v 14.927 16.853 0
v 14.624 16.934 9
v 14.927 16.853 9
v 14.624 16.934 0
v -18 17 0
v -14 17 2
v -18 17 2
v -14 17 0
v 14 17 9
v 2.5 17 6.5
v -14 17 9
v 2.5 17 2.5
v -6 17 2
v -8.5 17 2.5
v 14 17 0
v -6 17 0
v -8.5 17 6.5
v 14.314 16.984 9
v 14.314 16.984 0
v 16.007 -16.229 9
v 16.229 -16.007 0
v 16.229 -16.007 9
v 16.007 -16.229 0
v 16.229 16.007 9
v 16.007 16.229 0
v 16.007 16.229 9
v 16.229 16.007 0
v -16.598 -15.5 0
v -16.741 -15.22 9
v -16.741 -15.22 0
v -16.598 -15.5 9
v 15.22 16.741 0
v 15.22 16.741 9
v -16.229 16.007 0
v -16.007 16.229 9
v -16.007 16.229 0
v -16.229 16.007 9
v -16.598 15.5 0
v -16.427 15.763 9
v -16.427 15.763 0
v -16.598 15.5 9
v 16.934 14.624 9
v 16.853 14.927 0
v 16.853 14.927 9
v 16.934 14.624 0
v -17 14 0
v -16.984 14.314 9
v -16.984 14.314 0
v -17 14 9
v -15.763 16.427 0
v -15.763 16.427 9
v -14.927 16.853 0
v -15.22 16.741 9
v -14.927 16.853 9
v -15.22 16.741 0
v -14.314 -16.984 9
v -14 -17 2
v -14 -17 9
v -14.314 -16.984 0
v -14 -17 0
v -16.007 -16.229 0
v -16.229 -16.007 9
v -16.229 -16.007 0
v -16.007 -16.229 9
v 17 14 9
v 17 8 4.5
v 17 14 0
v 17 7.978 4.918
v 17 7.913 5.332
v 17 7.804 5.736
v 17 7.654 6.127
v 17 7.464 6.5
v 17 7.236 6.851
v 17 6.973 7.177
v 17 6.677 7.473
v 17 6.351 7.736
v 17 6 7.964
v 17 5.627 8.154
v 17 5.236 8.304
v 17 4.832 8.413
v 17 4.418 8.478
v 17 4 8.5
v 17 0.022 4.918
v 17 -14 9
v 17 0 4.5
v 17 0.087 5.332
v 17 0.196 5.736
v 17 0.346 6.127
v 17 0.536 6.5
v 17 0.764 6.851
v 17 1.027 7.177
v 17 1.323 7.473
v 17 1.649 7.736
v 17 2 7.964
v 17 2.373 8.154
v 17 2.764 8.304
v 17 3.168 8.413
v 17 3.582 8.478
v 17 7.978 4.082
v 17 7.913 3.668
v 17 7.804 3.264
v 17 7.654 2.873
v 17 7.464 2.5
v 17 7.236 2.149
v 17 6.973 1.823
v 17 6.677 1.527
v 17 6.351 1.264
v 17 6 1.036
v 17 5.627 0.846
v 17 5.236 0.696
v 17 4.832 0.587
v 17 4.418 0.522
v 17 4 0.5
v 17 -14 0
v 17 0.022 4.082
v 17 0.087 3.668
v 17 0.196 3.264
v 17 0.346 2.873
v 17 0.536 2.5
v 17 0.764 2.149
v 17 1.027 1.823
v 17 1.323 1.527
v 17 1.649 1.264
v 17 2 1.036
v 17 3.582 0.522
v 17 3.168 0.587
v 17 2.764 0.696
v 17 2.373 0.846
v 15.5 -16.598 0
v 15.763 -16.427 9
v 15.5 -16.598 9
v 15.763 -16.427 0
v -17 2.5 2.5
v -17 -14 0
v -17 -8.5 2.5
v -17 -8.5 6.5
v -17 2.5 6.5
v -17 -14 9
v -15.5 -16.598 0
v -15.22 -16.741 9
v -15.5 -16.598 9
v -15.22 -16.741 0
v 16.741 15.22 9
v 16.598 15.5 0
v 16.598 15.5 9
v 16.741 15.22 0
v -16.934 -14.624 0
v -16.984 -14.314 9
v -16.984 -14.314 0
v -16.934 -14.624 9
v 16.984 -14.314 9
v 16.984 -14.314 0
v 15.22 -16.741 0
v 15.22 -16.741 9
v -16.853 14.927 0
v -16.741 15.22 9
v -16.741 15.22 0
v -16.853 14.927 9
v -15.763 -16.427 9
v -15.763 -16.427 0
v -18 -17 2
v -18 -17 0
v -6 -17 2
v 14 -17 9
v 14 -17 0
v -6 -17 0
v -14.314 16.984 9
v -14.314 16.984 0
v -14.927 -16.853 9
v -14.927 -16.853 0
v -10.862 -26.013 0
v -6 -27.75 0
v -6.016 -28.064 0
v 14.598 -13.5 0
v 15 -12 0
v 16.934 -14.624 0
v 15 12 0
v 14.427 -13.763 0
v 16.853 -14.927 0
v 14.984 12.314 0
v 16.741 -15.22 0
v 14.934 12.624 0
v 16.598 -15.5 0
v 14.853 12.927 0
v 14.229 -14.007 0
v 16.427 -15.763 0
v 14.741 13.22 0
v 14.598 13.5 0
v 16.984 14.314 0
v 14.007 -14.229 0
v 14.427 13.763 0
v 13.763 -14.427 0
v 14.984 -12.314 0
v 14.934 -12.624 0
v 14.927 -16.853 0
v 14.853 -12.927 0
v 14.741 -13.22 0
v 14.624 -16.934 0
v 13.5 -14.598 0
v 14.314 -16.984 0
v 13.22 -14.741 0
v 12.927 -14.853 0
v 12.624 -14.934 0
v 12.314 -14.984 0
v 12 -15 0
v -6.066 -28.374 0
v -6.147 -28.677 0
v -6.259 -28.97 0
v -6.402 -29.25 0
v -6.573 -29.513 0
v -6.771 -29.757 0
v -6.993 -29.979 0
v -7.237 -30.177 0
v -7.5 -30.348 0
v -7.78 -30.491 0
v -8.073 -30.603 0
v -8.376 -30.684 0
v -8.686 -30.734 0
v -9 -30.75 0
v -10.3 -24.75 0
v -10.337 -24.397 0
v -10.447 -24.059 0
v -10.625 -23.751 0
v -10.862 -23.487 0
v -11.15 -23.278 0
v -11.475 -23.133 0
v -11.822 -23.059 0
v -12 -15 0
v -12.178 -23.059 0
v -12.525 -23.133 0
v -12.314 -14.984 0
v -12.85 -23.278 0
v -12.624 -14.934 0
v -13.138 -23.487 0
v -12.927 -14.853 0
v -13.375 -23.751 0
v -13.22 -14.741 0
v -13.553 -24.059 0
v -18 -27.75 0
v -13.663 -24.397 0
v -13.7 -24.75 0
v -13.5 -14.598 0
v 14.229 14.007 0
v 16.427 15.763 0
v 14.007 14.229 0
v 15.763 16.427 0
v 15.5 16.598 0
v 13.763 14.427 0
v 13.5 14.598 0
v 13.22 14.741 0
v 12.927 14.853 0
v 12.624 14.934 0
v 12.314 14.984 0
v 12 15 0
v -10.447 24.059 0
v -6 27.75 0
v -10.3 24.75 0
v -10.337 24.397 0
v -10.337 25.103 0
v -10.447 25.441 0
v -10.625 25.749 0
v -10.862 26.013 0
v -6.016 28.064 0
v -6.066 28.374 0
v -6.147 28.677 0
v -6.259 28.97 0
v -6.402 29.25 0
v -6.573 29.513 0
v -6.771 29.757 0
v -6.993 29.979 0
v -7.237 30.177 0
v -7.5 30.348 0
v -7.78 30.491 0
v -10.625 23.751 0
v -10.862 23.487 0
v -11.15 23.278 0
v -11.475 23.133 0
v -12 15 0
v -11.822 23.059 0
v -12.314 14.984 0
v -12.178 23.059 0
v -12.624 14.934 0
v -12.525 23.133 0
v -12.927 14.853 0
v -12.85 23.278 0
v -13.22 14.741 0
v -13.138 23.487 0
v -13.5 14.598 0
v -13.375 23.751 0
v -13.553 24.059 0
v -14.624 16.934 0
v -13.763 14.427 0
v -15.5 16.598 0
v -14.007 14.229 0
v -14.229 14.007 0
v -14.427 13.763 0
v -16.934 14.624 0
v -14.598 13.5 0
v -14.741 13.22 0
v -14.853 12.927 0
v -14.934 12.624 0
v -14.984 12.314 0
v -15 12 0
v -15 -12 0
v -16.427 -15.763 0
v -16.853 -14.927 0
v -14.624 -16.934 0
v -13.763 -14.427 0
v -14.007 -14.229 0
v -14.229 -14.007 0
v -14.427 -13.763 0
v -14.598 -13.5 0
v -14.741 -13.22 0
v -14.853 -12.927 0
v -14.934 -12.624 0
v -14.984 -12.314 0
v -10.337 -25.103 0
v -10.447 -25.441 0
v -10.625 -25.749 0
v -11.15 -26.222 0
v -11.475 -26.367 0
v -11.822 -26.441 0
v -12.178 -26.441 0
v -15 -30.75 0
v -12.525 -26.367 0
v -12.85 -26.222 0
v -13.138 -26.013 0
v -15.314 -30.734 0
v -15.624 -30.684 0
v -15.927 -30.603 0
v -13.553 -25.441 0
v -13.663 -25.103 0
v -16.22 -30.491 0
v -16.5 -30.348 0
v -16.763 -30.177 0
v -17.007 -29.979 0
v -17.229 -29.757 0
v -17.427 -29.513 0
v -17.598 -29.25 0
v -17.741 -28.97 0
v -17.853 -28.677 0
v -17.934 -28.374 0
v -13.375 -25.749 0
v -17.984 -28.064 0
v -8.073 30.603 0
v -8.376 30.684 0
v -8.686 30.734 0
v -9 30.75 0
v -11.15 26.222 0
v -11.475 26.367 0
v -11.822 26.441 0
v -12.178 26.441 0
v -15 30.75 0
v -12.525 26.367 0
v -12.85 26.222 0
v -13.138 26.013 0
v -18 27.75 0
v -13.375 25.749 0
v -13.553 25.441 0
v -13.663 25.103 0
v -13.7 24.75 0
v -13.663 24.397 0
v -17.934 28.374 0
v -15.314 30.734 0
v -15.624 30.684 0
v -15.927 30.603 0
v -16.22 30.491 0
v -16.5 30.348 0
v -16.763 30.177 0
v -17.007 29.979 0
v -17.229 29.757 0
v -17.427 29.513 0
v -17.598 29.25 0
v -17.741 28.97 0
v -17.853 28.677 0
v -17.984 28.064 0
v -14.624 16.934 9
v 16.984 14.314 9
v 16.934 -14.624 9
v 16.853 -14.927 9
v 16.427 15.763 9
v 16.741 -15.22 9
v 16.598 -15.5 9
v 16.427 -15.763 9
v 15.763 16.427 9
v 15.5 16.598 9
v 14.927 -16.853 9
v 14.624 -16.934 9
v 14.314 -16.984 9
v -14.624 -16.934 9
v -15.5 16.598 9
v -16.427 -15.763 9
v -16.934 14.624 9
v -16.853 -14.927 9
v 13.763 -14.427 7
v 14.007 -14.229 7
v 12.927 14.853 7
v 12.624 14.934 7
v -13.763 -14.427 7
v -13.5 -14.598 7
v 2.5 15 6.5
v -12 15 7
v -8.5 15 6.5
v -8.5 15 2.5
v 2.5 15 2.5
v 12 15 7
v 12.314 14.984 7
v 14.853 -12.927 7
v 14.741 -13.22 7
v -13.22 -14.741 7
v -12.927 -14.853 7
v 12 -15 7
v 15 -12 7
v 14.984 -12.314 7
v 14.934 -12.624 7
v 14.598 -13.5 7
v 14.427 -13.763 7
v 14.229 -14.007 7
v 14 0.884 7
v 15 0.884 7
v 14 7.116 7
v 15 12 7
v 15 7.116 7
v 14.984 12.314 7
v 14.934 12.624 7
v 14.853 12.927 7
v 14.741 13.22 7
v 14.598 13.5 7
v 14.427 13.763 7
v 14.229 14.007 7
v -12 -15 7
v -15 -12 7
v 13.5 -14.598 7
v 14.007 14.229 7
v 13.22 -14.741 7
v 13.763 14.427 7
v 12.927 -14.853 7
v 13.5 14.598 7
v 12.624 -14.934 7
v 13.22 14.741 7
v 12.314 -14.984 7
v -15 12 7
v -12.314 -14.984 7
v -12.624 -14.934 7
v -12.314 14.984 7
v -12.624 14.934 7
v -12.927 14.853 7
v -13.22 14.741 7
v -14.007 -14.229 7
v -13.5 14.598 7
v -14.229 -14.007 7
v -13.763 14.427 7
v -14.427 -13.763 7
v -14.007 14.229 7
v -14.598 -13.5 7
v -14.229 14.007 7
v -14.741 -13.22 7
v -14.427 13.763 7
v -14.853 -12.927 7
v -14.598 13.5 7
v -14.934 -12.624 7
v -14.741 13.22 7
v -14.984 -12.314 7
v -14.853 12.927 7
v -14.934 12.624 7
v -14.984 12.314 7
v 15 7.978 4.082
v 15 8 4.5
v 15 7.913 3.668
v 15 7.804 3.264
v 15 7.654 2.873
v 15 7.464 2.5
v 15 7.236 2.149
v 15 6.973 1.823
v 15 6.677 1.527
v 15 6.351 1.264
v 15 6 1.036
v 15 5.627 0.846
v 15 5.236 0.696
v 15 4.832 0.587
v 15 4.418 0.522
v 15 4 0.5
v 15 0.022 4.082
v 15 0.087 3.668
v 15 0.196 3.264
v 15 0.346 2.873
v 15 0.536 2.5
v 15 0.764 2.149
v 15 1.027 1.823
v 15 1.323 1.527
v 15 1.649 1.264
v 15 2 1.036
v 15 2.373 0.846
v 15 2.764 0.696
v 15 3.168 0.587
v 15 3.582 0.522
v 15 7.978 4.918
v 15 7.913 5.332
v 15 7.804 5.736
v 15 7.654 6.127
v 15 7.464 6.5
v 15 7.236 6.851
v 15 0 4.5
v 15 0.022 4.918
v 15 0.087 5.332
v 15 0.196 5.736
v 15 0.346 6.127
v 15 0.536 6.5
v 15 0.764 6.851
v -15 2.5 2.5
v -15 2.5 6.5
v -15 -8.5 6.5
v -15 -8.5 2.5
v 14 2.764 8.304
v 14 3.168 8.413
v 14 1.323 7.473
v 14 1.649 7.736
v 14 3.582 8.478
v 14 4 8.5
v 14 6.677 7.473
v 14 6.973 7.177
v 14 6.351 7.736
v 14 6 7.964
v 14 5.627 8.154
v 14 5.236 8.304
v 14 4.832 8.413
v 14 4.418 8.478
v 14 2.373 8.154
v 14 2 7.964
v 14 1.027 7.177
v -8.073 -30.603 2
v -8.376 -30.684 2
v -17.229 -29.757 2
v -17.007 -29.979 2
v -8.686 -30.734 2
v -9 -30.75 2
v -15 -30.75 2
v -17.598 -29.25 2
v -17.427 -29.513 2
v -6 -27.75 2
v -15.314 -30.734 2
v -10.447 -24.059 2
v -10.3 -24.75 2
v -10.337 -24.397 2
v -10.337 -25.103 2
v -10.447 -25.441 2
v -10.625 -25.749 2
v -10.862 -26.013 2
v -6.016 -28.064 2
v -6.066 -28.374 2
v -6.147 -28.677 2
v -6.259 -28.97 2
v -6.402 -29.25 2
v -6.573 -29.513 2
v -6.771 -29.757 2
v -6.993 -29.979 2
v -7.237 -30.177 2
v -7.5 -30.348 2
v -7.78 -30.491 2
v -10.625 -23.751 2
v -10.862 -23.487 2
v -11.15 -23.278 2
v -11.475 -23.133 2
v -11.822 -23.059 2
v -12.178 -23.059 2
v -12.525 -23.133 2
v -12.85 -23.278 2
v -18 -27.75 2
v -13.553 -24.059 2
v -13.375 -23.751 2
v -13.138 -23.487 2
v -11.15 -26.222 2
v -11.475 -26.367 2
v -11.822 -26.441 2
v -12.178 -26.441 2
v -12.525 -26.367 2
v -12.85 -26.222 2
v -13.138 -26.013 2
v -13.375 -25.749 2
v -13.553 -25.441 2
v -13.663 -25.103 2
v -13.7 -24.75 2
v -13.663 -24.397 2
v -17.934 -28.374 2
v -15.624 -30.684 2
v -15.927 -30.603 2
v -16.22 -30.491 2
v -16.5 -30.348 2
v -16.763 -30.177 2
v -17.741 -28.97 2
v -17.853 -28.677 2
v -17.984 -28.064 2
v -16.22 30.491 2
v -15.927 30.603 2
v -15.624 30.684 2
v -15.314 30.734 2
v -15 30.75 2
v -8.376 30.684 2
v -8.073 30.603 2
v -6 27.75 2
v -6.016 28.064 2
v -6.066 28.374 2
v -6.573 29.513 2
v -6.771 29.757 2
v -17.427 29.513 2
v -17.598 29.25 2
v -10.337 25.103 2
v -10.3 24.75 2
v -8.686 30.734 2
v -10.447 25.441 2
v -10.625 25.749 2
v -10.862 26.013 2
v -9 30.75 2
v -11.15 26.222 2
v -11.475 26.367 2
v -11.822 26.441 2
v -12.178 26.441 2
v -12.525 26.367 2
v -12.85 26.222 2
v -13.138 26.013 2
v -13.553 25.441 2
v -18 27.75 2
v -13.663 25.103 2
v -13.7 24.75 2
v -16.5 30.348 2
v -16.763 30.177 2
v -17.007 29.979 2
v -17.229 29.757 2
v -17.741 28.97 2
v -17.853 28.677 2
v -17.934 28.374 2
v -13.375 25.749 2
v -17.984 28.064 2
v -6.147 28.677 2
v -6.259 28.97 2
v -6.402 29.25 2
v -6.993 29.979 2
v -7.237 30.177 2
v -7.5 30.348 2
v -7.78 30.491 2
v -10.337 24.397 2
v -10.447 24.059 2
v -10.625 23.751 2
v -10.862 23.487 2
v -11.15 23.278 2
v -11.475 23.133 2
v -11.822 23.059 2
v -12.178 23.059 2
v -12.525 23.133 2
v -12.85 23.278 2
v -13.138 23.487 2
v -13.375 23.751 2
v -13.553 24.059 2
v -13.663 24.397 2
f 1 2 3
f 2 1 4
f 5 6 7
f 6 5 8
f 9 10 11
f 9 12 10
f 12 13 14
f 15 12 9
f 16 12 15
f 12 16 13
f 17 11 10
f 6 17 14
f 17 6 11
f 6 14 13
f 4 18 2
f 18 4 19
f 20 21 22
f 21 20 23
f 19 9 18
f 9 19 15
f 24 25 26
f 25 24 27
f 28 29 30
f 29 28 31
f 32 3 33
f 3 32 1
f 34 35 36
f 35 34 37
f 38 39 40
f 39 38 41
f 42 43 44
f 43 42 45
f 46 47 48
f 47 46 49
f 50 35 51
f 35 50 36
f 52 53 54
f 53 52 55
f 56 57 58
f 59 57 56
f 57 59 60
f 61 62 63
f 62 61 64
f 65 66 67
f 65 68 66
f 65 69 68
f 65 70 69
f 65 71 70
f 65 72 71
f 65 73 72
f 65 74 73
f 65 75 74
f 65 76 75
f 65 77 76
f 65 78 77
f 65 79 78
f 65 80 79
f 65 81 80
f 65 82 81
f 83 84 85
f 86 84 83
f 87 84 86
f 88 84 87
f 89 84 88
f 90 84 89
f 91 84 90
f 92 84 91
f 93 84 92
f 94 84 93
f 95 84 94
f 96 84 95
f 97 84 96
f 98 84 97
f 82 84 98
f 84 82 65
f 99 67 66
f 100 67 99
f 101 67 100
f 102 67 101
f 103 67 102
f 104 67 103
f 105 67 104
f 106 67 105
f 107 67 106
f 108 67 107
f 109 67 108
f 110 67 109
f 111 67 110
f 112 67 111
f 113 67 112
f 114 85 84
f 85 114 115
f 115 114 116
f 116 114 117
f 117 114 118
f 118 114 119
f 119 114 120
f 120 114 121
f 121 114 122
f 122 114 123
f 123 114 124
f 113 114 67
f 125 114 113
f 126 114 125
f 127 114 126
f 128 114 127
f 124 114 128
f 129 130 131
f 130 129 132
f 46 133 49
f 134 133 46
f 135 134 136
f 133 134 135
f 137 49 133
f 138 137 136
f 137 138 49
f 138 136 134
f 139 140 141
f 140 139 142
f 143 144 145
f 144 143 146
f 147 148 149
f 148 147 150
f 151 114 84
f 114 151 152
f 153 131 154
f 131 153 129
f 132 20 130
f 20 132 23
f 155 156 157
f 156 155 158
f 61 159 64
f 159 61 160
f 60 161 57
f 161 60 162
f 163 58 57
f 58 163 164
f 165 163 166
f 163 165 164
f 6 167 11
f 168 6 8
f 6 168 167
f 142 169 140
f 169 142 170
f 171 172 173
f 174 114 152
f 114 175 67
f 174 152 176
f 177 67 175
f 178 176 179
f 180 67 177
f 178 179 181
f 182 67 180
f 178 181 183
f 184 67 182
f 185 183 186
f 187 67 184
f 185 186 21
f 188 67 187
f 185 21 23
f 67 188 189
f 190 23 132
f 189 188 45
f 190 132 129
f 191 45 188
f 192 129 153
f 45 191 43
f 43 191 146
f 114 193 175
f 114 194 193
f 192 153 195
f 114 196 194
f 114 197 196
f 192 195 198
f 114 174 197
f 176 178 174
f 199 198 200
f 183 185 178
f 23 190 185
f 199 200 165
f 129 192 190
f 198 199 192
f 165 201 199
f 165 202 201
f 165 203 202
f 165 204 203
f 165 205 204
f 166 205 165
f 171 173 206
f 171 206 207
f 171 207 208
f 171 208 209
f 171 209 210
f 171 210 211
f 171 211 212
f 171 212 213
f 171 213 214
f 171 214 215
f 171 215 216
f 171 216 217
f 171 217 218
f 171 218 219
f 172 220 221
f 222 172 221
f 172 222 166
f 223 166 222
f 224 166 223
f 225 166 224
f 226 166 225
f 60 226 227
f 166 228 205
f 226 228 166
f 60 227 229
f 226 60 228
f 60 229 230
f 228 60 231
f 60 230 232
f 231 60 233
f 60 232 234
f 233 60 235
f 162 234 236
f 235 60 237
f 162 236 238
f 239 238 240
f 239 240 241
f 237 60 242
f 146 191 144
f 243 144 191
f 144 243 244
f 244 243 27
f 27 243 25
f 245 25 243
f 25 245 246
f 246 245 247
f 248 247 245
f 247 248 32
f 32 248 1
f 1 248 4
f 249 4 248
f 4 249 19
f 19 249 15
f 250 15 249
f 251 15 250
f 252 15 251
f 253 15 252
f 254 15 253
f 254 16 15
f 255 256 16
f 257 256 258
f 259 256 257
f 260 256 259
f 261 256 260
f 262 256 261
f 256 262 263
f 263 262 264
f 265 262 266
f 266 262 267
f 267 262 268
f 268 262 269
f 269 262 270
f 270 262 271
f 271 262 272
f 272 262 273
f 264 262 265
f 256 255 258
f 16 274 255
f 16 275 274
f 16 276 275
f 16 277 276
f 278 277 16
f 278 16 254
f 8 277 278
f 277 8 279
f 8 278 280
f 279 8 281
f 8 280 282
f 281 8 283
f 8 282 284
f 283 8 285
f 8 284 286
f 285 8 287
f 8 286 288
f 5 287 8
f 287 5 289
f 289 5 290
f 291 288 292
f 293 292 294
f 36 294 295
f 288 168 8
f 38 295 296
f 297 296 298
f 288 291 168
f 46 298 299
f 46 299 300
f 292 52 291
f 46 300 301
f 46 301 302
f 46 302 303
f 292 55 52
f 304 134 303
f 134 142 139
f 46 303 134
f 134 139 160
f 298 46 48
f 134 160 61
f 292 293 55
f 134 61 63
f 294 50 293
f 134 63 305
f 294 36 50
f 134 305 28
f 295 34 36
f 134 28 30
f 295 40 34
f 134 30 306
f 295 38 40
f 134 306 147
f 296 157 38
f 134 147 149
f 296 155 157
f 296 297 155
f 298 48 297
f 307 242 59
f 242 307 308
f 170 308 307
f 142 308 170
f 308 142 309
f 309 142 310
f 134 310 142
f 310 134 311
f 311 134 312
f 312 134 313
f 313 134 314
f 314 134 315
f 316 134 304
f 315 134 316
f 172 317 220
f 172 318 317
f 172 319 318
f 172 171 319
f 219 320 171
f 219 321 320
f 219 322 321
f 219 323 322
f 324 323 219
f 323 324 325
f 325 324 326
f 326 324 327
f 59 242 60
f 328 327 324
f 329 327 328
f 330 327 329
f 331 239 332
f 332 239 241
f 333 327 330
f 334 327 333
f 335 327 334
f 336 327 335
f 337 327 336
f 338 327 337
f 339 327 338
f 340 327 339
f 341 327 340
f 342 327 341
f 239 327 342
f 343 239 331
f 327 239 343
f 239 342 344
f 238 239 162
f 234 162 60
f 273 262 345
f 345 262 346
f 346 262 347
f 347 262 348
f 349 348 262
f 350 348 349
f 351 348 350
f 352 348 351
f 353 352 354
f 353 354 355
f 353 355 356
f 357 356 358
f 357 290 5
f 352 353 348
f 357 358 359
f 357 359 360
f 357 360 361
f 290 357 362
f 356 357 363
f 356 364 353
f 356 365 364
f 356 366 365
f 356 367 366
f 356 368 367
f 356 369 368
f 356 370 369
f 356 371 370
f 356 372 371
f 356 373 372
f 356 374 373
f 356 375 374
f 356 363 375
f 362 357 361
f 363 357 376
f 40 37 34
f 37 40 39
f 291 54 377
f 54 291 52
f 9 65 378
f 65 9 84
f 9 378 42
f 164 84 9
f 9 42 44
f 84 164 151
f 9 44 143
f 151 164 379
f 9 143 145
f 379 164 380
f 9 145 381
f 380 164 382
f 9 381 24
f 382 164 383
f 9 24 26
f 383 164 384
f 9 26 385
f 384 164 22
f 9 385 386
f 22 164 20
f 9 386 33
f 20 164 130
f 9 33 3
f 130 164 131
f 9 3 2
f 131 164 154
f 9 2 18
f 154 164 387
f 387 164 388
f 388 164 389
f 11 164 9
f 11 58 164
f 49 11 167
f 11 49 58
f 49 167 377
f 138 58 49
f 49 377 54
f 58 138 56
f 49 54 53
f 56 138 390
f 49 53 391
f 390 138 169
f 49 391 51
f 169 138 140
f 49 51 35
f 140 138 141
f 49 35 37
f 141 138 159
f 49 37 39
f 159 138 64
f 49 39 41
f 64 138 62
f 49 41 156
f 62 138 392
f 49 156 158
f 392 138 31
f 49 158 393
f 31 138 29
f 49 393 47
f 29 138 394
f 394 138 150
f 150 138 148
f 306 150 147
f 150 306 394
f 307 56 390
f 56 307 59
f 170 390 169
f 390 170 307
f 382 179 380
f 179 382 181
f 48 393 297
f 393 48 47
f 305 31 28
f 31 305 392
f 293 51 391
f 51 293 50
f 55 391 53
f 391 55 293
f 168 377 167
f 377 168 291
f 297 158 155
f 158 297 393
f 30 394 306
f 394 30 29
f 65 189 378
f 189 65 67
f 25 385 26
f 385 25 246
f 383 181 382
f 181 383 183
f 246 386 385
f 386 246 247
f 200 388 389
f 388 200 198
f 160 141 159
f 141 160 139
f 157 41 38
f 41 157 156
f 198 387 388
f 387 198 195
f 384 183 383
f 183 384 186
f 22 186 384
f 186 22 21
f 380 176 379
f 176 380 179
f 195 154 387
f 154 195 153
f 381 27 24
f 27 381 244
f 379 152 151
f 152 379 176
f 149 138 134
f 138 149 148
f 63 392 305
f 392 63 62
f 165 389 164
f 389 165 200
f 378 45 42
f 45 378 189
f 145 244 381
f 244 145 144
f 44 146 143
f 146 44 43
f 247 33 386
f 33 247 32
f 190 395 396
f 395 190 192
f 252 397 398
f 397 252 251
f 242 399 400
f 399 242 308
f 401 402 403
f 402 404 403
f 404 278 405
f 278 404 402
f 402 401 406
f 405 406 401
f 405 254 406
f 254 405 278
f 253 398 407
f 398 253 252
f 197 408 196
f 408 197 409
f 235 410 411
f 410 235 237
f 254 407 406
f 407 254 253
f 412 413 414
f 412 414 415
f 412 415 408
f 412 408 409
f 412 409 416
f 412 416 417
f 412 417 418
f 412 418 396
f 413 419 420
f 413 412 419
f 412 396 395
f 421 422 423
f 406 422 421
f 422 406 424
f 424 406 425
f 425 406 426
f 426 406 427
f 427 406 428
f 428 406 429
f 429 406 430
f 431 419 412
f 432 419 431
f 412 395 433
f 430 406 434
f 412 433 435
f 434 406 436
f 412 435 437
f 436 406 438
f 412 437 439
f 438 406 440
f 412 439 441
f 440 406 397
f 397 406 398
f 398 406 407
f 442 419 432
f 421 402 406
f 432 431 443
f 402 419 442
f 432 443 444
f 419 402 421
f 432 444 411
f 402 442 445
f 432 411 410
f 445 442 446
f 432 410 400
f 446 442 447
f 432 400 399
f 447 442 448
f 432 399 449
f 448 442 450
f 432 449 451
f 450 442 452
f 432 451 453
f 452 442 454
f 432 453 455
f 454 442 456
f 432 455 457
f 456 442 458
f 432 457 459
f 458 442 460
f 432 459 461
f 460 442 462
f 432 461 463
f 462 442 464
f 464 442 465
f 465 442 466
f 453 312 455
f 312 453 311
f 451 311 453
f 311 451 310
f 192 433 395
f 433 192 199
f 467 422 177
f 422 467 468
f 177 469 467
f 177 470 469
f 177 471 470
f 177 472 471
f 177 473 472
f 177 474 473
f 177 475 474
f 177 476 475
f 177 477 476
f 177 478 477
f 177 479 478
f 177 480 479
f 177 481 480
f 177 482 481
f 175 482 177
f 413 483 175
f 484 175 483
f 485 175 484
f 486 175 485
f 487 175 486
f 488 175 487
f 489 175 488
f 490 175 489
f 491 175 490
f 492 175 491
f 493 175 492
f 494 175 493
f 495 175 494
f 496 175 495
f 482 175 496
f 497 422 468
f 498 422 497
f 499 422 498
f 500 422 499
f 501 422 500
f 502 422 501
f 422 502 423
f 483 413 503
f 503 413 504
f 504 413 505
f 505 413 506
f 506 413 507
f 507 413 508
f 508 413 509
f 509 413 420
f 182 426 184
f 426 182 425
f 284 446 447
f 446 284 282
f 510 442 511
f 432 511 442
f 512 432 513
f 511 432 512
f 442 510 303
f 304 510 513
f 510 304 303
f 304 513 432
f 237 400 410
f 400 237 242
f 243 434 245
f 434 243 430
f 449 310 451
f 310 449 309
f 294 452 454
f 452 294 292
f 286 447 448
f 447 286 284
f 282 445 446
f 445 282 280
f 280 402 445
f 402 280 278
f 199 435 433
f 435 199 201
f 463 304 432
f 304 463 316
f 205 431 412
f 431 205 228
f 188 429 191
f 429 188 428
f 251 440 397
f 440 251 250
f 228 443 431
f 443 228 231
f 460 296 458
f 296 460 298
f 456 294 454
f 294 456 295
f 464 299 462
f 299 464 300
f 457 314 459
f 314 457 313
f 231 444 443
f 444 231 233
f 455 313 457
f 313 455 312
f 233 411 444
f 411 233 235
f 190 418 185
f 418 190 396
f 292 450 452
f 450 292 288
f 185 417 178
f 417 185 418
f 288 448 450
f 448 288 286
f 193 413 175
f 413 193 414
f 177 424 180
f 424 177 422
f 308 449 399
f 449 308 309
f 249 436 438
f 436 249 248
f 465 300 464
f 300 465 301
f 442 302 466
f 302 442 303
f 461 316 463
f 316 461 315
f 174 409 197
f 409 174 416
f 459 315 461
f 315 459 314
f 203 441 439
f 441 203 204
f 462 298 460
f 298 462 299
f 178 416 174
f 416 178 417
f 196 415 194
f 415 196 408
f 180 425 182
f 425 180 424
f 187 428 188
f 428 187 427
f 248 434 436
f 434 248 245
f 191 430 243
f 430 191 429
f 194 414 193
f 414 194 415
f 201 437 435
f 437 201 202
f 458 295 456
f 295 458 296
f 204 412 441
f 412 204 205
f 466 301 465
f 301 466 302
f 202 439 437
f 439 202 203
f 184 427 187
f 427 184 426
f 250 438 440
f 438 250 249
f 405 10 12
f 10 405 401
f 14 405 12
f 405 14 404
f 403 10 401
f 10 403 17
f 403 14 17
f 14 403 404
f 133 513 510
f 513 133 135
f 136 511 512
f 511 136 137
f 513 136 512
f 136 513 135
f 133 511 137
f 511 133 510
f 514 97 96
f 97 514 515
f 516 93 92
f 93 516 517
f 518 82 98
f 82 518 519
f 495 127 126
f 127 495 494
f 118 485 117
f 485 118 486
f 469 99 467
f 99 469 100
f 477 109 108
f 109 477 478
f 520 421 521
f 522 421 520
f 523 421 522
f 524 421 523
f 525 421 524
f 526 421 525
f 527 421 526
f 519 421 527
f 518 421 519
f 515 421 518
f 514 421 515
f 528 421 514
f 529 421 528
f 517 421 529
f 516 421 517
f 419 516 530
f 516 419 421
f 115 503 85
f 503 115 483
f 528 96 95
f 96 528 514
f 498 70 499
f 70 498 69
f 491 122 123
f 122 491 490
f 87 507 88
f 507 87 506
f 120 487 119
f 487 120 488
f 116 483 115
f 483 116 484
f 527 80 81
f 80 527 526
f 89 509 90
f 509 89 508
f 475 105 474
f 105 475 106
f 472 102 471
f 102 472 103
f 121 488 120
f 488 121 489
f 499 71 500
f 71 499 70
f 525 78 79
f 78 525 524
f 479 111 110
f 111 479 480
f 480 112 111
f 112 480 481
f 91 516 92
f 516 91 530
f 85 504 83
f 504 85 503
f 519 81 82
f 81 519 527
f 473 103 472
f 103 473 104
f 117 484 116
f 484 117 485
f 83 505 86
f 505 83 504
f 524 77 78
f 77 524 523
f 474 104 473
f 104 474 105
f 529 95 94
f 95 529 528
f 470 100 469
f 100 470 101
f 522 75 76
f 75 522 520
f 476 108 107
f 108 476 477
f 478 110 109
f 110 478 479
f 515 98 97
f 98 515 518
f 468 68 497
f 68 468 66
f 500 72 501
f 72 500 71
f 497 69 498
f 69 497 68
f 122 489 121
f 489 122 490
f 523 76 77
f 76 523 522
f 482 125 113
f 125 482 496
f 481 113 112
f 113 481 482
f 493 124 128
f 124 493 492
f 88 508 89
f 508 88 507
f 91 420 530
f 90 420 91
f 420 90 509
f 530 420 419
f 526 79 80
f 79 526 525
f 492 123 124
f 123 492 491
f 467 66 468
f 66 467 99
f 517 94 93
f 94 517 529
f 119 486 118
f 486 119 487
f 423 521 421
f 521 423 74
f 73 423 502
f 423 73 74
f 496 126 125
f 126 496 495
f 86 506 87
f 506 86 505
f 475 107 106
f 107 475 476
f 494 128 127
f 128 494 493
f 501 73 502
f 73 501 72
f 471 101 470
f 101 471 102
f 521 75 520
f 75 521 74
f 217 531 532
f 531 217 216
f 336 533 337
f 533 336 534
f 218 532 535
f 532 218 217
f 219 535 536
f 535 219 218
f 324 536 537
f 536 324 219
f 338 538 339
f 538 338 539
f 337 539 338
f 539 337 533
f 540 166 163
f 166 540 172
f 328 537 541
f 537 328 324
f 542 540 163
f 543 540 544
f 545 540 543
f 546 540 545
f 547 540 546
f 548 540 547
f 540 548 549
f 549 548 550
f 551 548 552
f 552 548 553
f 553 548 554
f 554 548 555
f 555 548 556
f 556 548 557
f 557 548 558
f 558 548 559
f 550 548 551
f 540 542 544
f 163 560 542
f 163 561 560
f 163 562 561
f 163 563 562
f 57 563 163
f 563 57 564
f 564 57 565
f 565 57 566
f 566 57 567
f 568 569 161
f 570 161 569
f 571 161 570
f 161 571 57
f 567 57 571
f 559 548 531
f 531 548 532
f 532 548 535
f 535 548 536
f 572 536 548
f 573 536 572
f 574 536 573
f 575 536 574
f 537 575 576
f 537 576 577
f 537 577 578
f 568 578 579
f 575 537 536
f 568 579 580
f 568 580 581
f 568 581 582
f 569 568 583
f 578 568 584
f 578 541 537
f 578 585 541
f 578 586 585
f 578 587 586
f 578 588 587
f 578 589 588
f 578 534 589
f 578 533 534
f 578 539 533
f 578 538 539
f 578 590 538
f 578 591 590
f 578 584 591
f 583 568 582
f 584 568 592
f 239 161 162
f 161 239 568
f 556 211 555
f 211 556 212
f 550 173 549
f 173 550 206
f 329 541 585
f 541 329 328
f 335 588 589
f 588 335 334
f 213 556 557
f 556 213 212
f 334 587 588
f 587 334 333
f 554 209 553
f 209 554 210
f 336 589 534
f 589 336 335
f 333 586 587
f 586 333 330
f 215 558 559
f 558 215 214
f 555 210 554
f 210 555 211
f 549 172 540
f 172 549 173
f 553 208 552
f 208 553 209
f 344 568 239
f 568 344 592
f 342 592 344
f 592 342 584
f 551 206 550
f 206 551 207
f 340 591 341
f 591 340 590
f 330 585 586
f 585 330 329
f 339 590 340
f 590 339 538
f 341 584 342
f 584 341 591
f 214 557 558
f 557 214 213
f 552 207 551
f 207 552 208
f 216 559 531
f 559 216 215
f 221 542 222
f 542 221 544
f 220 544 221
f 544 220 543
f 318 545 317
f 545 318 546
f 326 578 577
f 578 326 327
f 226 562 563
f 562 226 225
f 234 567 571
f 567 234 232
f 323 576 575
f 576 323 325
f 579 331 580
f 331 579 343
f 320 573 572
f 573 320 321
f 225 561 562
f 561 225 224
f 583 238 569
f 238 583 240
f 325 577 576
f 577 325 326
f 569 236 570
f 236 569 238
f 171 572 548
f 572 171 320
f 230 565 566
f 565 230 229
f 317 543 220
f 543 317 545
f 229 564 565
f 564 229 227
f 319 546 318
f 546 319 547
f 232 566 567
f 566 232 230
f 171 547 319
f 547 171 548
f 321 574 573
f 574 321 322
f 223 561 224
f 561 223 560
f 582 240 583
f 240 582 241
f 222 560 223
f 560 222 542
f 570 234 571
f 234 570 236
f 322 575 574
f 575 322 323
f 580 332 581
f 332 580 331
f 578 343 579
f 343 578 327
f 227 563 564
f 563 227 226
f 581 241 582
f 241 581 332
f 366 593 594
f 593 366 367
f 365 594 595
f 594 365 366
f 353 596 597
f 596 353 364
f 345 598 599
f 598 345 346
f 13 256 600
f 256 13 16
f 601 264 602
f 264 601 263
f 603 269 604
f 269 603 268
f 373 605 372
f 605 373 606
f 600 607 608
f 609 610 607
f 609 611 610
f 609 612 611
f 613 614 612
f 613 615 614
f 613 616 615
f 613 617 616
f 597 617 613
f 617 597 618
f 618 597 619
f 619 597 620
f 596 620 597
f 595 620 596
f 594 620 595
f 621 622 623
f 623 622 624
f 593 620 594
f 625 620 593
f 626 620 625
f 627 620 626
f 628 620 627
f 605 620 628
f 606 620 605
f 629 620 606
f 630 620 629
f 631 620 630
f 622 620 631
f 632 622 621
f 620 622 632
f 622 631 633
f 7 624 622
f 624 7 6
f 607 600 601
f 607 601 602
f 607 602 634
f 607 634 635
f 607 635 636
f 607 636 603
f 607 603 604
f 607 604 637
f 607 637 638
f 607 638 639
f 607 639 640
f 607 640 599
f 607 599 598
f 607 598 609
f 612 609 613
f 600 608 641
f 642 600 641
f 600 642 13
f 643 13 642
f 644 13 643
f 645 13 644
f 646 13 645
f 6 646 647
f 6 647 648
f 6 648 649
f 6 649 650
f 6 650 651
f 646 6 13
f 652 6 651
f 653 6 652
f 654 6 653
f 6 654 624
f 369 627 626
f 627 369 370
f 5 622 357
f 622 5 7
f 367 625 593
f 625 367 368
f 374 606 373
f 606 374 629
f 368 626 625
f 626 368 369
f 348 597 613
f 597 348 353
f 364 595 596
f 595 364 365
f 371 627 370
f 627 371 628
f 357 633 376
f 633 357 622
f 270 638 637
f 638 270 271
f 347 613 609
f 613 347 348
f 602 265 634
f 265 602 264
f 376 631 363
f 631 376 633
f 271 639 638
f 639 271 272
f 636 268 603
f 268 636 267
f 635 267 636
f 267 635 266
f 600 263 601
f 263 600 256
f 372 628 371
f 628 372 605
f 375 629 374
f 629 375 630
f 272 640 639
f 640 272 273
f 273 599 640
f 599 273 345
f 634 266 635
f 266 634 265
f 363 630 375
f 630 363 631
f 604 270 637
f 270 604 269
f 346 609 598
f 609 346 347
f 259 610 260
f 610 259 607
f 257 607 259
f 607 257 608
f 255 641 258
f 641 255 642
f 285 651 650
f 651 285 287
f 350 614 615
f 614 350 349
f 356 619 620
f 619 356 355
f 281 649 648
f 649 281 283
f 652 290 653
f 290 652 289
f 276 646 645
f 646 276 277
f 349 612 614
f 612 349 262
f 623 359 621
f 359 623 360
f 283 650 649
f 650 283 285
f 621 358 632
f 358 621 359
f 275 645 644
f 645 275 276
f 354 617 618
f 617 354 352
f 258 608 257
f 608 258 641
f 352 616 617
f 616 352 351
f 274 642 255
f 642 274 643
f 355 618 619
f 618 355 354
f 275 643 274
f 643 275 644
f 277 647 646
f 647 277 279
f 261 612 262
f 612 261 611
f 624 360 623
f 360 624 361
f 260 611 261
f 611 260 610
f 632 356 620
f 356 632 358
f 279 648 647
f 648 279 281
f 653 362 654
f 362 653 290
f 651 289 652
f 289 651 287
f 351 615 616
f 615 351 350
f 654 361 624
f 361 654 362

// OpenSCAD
/**
 * SKY-FOLD-10 — Remote ID Mount
 */

$fn = 60;

// --- Remote ID box (interior dimensions) ---
RID_W = 30;          // interior width (X)
RID_D = 30;          // interior depth (Y)
RID_H = 7;           // interior height (Z)
RID_CORNER_R = 3;    // corner rounding
RID_WALL = 2;        // wall thickness

// Outer dimensions (derived)
RID_OW = RID_W + 2*RID_WALL;   // outer width
RID_OD = RID_D + 2*RID_WALL;   // outer depth
RID_OH = RID_H + RID_WALL;     // outer height (floor + interior)

// --- GPS_OUT hole (west side, -Y face) ---
GPS_OUT_W = 11;       // hole width
GPS_OUT_H = 4;        // hole height
GPS_OUT_X = -3;        // X offset along side (0 = centered)
GPS_OUT_Z = -1;        // Z offset along side (0 = centered)

// --- GPS_IN hole (south side, -X face) ---
GPS_IN_W = 11;        // hole width
GPS_IN_H = 4;         // hole height
GPS_IN_Y = 3;         // Y offset along side (0 = centered)
GPS_IN_Z = -1;         // Z offset along side (0 = centered)

// --- M3 mounting tabs ---
TAB_SIZE = 12;        // tab width & depth
TAB_SPACING = 49.5;              // center-to-center distance between tabs — matches bridge FORE_AFT_D
TAB_SHIFT_X = -12;                 // slide all tabs + mount holes along X
TAB1_X = 0;                      // tab 1 X position
TAB1_Y = -TAB_SPACING/2;
TAB2_X = 0;                      // tab 2 X position
TAB2_Y = TAB_SPACING/2;

// --- Antenna hole (north side, +X face) ---
ANTENNA_D = 8;            // hole diameter
ANTENNA_Y = -4;            // Y offset along side (0 = centered)
ANTENNA_Z = -1;            // Z offset along side (0 = centered)

// 12x12 mounting tab with M3 hole
module m3_tab() {
    difference() {
        translate([-TAB_SIZE/2, -TAB_SIZE/2, 0])
            linear_extrude(height = RID_WALL)
                offset(r = RID_CORNER_R) offset(delta = -RID_CORNER_R)
                    square([TAB_SIZE, TAB_SIZE]);
        translate([0, 0, -1])
            cylinder(h = RID_WALL + 2, d = 3.4, $fn = 30);
    }
}

// Body — flipped so open side faces down, floor on top at Z = RID_H
translate([0, 0, RID_OH])
rotate([180, 0, 0])
difference() {
    // Outer shell
    translate([-RID_OW/2, -RID_OD/2, 0])
        linear_extrude(height = RID_OH)
            offset(r = RID_CORNER_R) offset(delta = -RID_CORNER_R)
                square([RID_OW, RID_OD]);

    // Hollow out — open top (interior = 29x29x8)
    translate([-RID_W/2, -RID_D/2, RID_WALL])
        linear_extrude(height = RID_H + 1)
            offset(r = RID_CORNER_R) offset(delta = -RID_CORNER_R)
                square([RID_W, RID_D]);

    // GPS_OUT hole (west side, -Y face)
    translate([GPS_OUT_X - GPS_OUT_W/2, -RID_OD/2 - 1, RID_WALL + (RID_H - GPS_OUT_H)/2 + GPS_OUT_Z])
        cube([GPS_OUT_W, RID_WALL + 2, GPS_OUT_H]);

    // GPS_IN hole (south side, -X face)
    translate([-RID_OW/2 - 1, GPS_IN_Y - GPS_IN_W/2, RID_WALL + (RID_H - GPS_IN_H)/2 + GPS_IN_Z])
        cube([RID_WALL + 2, GPS_IN_W, GPS_IN_H]);

    // Antenna hole (north side, +X face)
    translate([RID_OW/2 - 1, ANTENNA_Y, RID_WALL + RID_H/2 + ANTENNA_Z])
        rotate([0, 90, 0])
            cylinder(h = RID_WALL + 2, d = ANTENNA_D, center = true);

    // M3 pass-through holes (aligned with tabs, Y negated due to flip)
    translate([TAB1_X + TAB_SHIFT_X, -TAB1_Y, -1])
        cylinder(h = RID_OH + 2, d = 3.4, $fn = 30);
    translate([TAB2_X + TAB_SHIFT_X, -TAB2_Y, -1])
        cylinder(h = RID_OH + 2, d = 3.4, $fn = 30);

    // 6mm counterbore — stops before tabs so screws can grip
    translate([TAB1_X + TAB_SHIFT_X, -TAB1_Y, -1])
        cylinder(h = RID_OH - RID_WALL + 1, d = 6, $fn = 30);
    translate([TAB2_X + TAB_SHIFT_X, -TAB2_Y, -1])
        cylinder(h = RID_OH - RID_WALL + 1, d = 6, $fn = 30);
}

// Mounting tabs — at Z=0, same height as body bottom
translate([TAB1_X + TAB_SHIFT_X, TAB1_Y, 0])
    m3_tab();
translate([TAB2_X + TAB_SHIFT_X, TAB2_Y, 0])
    m3_tab();

// Connecting wings — bridge the gap between body edge and tabs
for (side = [-1, 1])
    difference() {
        translate([TAB_SHIFT_X - TAB_SIZE/2,
                   side > 0 ? RID_OD/2 : -TAB_SPACING/2,
                   0])
            cube([TAB_SIZE, TAB_SPACING/2 - RID_OD/2, RID_WALL]);
        // M3 clearance hole through wing
        translate([TAB_SHIFT_X, side * TAB_SPACING/2, -1])
            cylinder(h = RID_WALL + 2, d = 3.4, $fn = 30);
    }
